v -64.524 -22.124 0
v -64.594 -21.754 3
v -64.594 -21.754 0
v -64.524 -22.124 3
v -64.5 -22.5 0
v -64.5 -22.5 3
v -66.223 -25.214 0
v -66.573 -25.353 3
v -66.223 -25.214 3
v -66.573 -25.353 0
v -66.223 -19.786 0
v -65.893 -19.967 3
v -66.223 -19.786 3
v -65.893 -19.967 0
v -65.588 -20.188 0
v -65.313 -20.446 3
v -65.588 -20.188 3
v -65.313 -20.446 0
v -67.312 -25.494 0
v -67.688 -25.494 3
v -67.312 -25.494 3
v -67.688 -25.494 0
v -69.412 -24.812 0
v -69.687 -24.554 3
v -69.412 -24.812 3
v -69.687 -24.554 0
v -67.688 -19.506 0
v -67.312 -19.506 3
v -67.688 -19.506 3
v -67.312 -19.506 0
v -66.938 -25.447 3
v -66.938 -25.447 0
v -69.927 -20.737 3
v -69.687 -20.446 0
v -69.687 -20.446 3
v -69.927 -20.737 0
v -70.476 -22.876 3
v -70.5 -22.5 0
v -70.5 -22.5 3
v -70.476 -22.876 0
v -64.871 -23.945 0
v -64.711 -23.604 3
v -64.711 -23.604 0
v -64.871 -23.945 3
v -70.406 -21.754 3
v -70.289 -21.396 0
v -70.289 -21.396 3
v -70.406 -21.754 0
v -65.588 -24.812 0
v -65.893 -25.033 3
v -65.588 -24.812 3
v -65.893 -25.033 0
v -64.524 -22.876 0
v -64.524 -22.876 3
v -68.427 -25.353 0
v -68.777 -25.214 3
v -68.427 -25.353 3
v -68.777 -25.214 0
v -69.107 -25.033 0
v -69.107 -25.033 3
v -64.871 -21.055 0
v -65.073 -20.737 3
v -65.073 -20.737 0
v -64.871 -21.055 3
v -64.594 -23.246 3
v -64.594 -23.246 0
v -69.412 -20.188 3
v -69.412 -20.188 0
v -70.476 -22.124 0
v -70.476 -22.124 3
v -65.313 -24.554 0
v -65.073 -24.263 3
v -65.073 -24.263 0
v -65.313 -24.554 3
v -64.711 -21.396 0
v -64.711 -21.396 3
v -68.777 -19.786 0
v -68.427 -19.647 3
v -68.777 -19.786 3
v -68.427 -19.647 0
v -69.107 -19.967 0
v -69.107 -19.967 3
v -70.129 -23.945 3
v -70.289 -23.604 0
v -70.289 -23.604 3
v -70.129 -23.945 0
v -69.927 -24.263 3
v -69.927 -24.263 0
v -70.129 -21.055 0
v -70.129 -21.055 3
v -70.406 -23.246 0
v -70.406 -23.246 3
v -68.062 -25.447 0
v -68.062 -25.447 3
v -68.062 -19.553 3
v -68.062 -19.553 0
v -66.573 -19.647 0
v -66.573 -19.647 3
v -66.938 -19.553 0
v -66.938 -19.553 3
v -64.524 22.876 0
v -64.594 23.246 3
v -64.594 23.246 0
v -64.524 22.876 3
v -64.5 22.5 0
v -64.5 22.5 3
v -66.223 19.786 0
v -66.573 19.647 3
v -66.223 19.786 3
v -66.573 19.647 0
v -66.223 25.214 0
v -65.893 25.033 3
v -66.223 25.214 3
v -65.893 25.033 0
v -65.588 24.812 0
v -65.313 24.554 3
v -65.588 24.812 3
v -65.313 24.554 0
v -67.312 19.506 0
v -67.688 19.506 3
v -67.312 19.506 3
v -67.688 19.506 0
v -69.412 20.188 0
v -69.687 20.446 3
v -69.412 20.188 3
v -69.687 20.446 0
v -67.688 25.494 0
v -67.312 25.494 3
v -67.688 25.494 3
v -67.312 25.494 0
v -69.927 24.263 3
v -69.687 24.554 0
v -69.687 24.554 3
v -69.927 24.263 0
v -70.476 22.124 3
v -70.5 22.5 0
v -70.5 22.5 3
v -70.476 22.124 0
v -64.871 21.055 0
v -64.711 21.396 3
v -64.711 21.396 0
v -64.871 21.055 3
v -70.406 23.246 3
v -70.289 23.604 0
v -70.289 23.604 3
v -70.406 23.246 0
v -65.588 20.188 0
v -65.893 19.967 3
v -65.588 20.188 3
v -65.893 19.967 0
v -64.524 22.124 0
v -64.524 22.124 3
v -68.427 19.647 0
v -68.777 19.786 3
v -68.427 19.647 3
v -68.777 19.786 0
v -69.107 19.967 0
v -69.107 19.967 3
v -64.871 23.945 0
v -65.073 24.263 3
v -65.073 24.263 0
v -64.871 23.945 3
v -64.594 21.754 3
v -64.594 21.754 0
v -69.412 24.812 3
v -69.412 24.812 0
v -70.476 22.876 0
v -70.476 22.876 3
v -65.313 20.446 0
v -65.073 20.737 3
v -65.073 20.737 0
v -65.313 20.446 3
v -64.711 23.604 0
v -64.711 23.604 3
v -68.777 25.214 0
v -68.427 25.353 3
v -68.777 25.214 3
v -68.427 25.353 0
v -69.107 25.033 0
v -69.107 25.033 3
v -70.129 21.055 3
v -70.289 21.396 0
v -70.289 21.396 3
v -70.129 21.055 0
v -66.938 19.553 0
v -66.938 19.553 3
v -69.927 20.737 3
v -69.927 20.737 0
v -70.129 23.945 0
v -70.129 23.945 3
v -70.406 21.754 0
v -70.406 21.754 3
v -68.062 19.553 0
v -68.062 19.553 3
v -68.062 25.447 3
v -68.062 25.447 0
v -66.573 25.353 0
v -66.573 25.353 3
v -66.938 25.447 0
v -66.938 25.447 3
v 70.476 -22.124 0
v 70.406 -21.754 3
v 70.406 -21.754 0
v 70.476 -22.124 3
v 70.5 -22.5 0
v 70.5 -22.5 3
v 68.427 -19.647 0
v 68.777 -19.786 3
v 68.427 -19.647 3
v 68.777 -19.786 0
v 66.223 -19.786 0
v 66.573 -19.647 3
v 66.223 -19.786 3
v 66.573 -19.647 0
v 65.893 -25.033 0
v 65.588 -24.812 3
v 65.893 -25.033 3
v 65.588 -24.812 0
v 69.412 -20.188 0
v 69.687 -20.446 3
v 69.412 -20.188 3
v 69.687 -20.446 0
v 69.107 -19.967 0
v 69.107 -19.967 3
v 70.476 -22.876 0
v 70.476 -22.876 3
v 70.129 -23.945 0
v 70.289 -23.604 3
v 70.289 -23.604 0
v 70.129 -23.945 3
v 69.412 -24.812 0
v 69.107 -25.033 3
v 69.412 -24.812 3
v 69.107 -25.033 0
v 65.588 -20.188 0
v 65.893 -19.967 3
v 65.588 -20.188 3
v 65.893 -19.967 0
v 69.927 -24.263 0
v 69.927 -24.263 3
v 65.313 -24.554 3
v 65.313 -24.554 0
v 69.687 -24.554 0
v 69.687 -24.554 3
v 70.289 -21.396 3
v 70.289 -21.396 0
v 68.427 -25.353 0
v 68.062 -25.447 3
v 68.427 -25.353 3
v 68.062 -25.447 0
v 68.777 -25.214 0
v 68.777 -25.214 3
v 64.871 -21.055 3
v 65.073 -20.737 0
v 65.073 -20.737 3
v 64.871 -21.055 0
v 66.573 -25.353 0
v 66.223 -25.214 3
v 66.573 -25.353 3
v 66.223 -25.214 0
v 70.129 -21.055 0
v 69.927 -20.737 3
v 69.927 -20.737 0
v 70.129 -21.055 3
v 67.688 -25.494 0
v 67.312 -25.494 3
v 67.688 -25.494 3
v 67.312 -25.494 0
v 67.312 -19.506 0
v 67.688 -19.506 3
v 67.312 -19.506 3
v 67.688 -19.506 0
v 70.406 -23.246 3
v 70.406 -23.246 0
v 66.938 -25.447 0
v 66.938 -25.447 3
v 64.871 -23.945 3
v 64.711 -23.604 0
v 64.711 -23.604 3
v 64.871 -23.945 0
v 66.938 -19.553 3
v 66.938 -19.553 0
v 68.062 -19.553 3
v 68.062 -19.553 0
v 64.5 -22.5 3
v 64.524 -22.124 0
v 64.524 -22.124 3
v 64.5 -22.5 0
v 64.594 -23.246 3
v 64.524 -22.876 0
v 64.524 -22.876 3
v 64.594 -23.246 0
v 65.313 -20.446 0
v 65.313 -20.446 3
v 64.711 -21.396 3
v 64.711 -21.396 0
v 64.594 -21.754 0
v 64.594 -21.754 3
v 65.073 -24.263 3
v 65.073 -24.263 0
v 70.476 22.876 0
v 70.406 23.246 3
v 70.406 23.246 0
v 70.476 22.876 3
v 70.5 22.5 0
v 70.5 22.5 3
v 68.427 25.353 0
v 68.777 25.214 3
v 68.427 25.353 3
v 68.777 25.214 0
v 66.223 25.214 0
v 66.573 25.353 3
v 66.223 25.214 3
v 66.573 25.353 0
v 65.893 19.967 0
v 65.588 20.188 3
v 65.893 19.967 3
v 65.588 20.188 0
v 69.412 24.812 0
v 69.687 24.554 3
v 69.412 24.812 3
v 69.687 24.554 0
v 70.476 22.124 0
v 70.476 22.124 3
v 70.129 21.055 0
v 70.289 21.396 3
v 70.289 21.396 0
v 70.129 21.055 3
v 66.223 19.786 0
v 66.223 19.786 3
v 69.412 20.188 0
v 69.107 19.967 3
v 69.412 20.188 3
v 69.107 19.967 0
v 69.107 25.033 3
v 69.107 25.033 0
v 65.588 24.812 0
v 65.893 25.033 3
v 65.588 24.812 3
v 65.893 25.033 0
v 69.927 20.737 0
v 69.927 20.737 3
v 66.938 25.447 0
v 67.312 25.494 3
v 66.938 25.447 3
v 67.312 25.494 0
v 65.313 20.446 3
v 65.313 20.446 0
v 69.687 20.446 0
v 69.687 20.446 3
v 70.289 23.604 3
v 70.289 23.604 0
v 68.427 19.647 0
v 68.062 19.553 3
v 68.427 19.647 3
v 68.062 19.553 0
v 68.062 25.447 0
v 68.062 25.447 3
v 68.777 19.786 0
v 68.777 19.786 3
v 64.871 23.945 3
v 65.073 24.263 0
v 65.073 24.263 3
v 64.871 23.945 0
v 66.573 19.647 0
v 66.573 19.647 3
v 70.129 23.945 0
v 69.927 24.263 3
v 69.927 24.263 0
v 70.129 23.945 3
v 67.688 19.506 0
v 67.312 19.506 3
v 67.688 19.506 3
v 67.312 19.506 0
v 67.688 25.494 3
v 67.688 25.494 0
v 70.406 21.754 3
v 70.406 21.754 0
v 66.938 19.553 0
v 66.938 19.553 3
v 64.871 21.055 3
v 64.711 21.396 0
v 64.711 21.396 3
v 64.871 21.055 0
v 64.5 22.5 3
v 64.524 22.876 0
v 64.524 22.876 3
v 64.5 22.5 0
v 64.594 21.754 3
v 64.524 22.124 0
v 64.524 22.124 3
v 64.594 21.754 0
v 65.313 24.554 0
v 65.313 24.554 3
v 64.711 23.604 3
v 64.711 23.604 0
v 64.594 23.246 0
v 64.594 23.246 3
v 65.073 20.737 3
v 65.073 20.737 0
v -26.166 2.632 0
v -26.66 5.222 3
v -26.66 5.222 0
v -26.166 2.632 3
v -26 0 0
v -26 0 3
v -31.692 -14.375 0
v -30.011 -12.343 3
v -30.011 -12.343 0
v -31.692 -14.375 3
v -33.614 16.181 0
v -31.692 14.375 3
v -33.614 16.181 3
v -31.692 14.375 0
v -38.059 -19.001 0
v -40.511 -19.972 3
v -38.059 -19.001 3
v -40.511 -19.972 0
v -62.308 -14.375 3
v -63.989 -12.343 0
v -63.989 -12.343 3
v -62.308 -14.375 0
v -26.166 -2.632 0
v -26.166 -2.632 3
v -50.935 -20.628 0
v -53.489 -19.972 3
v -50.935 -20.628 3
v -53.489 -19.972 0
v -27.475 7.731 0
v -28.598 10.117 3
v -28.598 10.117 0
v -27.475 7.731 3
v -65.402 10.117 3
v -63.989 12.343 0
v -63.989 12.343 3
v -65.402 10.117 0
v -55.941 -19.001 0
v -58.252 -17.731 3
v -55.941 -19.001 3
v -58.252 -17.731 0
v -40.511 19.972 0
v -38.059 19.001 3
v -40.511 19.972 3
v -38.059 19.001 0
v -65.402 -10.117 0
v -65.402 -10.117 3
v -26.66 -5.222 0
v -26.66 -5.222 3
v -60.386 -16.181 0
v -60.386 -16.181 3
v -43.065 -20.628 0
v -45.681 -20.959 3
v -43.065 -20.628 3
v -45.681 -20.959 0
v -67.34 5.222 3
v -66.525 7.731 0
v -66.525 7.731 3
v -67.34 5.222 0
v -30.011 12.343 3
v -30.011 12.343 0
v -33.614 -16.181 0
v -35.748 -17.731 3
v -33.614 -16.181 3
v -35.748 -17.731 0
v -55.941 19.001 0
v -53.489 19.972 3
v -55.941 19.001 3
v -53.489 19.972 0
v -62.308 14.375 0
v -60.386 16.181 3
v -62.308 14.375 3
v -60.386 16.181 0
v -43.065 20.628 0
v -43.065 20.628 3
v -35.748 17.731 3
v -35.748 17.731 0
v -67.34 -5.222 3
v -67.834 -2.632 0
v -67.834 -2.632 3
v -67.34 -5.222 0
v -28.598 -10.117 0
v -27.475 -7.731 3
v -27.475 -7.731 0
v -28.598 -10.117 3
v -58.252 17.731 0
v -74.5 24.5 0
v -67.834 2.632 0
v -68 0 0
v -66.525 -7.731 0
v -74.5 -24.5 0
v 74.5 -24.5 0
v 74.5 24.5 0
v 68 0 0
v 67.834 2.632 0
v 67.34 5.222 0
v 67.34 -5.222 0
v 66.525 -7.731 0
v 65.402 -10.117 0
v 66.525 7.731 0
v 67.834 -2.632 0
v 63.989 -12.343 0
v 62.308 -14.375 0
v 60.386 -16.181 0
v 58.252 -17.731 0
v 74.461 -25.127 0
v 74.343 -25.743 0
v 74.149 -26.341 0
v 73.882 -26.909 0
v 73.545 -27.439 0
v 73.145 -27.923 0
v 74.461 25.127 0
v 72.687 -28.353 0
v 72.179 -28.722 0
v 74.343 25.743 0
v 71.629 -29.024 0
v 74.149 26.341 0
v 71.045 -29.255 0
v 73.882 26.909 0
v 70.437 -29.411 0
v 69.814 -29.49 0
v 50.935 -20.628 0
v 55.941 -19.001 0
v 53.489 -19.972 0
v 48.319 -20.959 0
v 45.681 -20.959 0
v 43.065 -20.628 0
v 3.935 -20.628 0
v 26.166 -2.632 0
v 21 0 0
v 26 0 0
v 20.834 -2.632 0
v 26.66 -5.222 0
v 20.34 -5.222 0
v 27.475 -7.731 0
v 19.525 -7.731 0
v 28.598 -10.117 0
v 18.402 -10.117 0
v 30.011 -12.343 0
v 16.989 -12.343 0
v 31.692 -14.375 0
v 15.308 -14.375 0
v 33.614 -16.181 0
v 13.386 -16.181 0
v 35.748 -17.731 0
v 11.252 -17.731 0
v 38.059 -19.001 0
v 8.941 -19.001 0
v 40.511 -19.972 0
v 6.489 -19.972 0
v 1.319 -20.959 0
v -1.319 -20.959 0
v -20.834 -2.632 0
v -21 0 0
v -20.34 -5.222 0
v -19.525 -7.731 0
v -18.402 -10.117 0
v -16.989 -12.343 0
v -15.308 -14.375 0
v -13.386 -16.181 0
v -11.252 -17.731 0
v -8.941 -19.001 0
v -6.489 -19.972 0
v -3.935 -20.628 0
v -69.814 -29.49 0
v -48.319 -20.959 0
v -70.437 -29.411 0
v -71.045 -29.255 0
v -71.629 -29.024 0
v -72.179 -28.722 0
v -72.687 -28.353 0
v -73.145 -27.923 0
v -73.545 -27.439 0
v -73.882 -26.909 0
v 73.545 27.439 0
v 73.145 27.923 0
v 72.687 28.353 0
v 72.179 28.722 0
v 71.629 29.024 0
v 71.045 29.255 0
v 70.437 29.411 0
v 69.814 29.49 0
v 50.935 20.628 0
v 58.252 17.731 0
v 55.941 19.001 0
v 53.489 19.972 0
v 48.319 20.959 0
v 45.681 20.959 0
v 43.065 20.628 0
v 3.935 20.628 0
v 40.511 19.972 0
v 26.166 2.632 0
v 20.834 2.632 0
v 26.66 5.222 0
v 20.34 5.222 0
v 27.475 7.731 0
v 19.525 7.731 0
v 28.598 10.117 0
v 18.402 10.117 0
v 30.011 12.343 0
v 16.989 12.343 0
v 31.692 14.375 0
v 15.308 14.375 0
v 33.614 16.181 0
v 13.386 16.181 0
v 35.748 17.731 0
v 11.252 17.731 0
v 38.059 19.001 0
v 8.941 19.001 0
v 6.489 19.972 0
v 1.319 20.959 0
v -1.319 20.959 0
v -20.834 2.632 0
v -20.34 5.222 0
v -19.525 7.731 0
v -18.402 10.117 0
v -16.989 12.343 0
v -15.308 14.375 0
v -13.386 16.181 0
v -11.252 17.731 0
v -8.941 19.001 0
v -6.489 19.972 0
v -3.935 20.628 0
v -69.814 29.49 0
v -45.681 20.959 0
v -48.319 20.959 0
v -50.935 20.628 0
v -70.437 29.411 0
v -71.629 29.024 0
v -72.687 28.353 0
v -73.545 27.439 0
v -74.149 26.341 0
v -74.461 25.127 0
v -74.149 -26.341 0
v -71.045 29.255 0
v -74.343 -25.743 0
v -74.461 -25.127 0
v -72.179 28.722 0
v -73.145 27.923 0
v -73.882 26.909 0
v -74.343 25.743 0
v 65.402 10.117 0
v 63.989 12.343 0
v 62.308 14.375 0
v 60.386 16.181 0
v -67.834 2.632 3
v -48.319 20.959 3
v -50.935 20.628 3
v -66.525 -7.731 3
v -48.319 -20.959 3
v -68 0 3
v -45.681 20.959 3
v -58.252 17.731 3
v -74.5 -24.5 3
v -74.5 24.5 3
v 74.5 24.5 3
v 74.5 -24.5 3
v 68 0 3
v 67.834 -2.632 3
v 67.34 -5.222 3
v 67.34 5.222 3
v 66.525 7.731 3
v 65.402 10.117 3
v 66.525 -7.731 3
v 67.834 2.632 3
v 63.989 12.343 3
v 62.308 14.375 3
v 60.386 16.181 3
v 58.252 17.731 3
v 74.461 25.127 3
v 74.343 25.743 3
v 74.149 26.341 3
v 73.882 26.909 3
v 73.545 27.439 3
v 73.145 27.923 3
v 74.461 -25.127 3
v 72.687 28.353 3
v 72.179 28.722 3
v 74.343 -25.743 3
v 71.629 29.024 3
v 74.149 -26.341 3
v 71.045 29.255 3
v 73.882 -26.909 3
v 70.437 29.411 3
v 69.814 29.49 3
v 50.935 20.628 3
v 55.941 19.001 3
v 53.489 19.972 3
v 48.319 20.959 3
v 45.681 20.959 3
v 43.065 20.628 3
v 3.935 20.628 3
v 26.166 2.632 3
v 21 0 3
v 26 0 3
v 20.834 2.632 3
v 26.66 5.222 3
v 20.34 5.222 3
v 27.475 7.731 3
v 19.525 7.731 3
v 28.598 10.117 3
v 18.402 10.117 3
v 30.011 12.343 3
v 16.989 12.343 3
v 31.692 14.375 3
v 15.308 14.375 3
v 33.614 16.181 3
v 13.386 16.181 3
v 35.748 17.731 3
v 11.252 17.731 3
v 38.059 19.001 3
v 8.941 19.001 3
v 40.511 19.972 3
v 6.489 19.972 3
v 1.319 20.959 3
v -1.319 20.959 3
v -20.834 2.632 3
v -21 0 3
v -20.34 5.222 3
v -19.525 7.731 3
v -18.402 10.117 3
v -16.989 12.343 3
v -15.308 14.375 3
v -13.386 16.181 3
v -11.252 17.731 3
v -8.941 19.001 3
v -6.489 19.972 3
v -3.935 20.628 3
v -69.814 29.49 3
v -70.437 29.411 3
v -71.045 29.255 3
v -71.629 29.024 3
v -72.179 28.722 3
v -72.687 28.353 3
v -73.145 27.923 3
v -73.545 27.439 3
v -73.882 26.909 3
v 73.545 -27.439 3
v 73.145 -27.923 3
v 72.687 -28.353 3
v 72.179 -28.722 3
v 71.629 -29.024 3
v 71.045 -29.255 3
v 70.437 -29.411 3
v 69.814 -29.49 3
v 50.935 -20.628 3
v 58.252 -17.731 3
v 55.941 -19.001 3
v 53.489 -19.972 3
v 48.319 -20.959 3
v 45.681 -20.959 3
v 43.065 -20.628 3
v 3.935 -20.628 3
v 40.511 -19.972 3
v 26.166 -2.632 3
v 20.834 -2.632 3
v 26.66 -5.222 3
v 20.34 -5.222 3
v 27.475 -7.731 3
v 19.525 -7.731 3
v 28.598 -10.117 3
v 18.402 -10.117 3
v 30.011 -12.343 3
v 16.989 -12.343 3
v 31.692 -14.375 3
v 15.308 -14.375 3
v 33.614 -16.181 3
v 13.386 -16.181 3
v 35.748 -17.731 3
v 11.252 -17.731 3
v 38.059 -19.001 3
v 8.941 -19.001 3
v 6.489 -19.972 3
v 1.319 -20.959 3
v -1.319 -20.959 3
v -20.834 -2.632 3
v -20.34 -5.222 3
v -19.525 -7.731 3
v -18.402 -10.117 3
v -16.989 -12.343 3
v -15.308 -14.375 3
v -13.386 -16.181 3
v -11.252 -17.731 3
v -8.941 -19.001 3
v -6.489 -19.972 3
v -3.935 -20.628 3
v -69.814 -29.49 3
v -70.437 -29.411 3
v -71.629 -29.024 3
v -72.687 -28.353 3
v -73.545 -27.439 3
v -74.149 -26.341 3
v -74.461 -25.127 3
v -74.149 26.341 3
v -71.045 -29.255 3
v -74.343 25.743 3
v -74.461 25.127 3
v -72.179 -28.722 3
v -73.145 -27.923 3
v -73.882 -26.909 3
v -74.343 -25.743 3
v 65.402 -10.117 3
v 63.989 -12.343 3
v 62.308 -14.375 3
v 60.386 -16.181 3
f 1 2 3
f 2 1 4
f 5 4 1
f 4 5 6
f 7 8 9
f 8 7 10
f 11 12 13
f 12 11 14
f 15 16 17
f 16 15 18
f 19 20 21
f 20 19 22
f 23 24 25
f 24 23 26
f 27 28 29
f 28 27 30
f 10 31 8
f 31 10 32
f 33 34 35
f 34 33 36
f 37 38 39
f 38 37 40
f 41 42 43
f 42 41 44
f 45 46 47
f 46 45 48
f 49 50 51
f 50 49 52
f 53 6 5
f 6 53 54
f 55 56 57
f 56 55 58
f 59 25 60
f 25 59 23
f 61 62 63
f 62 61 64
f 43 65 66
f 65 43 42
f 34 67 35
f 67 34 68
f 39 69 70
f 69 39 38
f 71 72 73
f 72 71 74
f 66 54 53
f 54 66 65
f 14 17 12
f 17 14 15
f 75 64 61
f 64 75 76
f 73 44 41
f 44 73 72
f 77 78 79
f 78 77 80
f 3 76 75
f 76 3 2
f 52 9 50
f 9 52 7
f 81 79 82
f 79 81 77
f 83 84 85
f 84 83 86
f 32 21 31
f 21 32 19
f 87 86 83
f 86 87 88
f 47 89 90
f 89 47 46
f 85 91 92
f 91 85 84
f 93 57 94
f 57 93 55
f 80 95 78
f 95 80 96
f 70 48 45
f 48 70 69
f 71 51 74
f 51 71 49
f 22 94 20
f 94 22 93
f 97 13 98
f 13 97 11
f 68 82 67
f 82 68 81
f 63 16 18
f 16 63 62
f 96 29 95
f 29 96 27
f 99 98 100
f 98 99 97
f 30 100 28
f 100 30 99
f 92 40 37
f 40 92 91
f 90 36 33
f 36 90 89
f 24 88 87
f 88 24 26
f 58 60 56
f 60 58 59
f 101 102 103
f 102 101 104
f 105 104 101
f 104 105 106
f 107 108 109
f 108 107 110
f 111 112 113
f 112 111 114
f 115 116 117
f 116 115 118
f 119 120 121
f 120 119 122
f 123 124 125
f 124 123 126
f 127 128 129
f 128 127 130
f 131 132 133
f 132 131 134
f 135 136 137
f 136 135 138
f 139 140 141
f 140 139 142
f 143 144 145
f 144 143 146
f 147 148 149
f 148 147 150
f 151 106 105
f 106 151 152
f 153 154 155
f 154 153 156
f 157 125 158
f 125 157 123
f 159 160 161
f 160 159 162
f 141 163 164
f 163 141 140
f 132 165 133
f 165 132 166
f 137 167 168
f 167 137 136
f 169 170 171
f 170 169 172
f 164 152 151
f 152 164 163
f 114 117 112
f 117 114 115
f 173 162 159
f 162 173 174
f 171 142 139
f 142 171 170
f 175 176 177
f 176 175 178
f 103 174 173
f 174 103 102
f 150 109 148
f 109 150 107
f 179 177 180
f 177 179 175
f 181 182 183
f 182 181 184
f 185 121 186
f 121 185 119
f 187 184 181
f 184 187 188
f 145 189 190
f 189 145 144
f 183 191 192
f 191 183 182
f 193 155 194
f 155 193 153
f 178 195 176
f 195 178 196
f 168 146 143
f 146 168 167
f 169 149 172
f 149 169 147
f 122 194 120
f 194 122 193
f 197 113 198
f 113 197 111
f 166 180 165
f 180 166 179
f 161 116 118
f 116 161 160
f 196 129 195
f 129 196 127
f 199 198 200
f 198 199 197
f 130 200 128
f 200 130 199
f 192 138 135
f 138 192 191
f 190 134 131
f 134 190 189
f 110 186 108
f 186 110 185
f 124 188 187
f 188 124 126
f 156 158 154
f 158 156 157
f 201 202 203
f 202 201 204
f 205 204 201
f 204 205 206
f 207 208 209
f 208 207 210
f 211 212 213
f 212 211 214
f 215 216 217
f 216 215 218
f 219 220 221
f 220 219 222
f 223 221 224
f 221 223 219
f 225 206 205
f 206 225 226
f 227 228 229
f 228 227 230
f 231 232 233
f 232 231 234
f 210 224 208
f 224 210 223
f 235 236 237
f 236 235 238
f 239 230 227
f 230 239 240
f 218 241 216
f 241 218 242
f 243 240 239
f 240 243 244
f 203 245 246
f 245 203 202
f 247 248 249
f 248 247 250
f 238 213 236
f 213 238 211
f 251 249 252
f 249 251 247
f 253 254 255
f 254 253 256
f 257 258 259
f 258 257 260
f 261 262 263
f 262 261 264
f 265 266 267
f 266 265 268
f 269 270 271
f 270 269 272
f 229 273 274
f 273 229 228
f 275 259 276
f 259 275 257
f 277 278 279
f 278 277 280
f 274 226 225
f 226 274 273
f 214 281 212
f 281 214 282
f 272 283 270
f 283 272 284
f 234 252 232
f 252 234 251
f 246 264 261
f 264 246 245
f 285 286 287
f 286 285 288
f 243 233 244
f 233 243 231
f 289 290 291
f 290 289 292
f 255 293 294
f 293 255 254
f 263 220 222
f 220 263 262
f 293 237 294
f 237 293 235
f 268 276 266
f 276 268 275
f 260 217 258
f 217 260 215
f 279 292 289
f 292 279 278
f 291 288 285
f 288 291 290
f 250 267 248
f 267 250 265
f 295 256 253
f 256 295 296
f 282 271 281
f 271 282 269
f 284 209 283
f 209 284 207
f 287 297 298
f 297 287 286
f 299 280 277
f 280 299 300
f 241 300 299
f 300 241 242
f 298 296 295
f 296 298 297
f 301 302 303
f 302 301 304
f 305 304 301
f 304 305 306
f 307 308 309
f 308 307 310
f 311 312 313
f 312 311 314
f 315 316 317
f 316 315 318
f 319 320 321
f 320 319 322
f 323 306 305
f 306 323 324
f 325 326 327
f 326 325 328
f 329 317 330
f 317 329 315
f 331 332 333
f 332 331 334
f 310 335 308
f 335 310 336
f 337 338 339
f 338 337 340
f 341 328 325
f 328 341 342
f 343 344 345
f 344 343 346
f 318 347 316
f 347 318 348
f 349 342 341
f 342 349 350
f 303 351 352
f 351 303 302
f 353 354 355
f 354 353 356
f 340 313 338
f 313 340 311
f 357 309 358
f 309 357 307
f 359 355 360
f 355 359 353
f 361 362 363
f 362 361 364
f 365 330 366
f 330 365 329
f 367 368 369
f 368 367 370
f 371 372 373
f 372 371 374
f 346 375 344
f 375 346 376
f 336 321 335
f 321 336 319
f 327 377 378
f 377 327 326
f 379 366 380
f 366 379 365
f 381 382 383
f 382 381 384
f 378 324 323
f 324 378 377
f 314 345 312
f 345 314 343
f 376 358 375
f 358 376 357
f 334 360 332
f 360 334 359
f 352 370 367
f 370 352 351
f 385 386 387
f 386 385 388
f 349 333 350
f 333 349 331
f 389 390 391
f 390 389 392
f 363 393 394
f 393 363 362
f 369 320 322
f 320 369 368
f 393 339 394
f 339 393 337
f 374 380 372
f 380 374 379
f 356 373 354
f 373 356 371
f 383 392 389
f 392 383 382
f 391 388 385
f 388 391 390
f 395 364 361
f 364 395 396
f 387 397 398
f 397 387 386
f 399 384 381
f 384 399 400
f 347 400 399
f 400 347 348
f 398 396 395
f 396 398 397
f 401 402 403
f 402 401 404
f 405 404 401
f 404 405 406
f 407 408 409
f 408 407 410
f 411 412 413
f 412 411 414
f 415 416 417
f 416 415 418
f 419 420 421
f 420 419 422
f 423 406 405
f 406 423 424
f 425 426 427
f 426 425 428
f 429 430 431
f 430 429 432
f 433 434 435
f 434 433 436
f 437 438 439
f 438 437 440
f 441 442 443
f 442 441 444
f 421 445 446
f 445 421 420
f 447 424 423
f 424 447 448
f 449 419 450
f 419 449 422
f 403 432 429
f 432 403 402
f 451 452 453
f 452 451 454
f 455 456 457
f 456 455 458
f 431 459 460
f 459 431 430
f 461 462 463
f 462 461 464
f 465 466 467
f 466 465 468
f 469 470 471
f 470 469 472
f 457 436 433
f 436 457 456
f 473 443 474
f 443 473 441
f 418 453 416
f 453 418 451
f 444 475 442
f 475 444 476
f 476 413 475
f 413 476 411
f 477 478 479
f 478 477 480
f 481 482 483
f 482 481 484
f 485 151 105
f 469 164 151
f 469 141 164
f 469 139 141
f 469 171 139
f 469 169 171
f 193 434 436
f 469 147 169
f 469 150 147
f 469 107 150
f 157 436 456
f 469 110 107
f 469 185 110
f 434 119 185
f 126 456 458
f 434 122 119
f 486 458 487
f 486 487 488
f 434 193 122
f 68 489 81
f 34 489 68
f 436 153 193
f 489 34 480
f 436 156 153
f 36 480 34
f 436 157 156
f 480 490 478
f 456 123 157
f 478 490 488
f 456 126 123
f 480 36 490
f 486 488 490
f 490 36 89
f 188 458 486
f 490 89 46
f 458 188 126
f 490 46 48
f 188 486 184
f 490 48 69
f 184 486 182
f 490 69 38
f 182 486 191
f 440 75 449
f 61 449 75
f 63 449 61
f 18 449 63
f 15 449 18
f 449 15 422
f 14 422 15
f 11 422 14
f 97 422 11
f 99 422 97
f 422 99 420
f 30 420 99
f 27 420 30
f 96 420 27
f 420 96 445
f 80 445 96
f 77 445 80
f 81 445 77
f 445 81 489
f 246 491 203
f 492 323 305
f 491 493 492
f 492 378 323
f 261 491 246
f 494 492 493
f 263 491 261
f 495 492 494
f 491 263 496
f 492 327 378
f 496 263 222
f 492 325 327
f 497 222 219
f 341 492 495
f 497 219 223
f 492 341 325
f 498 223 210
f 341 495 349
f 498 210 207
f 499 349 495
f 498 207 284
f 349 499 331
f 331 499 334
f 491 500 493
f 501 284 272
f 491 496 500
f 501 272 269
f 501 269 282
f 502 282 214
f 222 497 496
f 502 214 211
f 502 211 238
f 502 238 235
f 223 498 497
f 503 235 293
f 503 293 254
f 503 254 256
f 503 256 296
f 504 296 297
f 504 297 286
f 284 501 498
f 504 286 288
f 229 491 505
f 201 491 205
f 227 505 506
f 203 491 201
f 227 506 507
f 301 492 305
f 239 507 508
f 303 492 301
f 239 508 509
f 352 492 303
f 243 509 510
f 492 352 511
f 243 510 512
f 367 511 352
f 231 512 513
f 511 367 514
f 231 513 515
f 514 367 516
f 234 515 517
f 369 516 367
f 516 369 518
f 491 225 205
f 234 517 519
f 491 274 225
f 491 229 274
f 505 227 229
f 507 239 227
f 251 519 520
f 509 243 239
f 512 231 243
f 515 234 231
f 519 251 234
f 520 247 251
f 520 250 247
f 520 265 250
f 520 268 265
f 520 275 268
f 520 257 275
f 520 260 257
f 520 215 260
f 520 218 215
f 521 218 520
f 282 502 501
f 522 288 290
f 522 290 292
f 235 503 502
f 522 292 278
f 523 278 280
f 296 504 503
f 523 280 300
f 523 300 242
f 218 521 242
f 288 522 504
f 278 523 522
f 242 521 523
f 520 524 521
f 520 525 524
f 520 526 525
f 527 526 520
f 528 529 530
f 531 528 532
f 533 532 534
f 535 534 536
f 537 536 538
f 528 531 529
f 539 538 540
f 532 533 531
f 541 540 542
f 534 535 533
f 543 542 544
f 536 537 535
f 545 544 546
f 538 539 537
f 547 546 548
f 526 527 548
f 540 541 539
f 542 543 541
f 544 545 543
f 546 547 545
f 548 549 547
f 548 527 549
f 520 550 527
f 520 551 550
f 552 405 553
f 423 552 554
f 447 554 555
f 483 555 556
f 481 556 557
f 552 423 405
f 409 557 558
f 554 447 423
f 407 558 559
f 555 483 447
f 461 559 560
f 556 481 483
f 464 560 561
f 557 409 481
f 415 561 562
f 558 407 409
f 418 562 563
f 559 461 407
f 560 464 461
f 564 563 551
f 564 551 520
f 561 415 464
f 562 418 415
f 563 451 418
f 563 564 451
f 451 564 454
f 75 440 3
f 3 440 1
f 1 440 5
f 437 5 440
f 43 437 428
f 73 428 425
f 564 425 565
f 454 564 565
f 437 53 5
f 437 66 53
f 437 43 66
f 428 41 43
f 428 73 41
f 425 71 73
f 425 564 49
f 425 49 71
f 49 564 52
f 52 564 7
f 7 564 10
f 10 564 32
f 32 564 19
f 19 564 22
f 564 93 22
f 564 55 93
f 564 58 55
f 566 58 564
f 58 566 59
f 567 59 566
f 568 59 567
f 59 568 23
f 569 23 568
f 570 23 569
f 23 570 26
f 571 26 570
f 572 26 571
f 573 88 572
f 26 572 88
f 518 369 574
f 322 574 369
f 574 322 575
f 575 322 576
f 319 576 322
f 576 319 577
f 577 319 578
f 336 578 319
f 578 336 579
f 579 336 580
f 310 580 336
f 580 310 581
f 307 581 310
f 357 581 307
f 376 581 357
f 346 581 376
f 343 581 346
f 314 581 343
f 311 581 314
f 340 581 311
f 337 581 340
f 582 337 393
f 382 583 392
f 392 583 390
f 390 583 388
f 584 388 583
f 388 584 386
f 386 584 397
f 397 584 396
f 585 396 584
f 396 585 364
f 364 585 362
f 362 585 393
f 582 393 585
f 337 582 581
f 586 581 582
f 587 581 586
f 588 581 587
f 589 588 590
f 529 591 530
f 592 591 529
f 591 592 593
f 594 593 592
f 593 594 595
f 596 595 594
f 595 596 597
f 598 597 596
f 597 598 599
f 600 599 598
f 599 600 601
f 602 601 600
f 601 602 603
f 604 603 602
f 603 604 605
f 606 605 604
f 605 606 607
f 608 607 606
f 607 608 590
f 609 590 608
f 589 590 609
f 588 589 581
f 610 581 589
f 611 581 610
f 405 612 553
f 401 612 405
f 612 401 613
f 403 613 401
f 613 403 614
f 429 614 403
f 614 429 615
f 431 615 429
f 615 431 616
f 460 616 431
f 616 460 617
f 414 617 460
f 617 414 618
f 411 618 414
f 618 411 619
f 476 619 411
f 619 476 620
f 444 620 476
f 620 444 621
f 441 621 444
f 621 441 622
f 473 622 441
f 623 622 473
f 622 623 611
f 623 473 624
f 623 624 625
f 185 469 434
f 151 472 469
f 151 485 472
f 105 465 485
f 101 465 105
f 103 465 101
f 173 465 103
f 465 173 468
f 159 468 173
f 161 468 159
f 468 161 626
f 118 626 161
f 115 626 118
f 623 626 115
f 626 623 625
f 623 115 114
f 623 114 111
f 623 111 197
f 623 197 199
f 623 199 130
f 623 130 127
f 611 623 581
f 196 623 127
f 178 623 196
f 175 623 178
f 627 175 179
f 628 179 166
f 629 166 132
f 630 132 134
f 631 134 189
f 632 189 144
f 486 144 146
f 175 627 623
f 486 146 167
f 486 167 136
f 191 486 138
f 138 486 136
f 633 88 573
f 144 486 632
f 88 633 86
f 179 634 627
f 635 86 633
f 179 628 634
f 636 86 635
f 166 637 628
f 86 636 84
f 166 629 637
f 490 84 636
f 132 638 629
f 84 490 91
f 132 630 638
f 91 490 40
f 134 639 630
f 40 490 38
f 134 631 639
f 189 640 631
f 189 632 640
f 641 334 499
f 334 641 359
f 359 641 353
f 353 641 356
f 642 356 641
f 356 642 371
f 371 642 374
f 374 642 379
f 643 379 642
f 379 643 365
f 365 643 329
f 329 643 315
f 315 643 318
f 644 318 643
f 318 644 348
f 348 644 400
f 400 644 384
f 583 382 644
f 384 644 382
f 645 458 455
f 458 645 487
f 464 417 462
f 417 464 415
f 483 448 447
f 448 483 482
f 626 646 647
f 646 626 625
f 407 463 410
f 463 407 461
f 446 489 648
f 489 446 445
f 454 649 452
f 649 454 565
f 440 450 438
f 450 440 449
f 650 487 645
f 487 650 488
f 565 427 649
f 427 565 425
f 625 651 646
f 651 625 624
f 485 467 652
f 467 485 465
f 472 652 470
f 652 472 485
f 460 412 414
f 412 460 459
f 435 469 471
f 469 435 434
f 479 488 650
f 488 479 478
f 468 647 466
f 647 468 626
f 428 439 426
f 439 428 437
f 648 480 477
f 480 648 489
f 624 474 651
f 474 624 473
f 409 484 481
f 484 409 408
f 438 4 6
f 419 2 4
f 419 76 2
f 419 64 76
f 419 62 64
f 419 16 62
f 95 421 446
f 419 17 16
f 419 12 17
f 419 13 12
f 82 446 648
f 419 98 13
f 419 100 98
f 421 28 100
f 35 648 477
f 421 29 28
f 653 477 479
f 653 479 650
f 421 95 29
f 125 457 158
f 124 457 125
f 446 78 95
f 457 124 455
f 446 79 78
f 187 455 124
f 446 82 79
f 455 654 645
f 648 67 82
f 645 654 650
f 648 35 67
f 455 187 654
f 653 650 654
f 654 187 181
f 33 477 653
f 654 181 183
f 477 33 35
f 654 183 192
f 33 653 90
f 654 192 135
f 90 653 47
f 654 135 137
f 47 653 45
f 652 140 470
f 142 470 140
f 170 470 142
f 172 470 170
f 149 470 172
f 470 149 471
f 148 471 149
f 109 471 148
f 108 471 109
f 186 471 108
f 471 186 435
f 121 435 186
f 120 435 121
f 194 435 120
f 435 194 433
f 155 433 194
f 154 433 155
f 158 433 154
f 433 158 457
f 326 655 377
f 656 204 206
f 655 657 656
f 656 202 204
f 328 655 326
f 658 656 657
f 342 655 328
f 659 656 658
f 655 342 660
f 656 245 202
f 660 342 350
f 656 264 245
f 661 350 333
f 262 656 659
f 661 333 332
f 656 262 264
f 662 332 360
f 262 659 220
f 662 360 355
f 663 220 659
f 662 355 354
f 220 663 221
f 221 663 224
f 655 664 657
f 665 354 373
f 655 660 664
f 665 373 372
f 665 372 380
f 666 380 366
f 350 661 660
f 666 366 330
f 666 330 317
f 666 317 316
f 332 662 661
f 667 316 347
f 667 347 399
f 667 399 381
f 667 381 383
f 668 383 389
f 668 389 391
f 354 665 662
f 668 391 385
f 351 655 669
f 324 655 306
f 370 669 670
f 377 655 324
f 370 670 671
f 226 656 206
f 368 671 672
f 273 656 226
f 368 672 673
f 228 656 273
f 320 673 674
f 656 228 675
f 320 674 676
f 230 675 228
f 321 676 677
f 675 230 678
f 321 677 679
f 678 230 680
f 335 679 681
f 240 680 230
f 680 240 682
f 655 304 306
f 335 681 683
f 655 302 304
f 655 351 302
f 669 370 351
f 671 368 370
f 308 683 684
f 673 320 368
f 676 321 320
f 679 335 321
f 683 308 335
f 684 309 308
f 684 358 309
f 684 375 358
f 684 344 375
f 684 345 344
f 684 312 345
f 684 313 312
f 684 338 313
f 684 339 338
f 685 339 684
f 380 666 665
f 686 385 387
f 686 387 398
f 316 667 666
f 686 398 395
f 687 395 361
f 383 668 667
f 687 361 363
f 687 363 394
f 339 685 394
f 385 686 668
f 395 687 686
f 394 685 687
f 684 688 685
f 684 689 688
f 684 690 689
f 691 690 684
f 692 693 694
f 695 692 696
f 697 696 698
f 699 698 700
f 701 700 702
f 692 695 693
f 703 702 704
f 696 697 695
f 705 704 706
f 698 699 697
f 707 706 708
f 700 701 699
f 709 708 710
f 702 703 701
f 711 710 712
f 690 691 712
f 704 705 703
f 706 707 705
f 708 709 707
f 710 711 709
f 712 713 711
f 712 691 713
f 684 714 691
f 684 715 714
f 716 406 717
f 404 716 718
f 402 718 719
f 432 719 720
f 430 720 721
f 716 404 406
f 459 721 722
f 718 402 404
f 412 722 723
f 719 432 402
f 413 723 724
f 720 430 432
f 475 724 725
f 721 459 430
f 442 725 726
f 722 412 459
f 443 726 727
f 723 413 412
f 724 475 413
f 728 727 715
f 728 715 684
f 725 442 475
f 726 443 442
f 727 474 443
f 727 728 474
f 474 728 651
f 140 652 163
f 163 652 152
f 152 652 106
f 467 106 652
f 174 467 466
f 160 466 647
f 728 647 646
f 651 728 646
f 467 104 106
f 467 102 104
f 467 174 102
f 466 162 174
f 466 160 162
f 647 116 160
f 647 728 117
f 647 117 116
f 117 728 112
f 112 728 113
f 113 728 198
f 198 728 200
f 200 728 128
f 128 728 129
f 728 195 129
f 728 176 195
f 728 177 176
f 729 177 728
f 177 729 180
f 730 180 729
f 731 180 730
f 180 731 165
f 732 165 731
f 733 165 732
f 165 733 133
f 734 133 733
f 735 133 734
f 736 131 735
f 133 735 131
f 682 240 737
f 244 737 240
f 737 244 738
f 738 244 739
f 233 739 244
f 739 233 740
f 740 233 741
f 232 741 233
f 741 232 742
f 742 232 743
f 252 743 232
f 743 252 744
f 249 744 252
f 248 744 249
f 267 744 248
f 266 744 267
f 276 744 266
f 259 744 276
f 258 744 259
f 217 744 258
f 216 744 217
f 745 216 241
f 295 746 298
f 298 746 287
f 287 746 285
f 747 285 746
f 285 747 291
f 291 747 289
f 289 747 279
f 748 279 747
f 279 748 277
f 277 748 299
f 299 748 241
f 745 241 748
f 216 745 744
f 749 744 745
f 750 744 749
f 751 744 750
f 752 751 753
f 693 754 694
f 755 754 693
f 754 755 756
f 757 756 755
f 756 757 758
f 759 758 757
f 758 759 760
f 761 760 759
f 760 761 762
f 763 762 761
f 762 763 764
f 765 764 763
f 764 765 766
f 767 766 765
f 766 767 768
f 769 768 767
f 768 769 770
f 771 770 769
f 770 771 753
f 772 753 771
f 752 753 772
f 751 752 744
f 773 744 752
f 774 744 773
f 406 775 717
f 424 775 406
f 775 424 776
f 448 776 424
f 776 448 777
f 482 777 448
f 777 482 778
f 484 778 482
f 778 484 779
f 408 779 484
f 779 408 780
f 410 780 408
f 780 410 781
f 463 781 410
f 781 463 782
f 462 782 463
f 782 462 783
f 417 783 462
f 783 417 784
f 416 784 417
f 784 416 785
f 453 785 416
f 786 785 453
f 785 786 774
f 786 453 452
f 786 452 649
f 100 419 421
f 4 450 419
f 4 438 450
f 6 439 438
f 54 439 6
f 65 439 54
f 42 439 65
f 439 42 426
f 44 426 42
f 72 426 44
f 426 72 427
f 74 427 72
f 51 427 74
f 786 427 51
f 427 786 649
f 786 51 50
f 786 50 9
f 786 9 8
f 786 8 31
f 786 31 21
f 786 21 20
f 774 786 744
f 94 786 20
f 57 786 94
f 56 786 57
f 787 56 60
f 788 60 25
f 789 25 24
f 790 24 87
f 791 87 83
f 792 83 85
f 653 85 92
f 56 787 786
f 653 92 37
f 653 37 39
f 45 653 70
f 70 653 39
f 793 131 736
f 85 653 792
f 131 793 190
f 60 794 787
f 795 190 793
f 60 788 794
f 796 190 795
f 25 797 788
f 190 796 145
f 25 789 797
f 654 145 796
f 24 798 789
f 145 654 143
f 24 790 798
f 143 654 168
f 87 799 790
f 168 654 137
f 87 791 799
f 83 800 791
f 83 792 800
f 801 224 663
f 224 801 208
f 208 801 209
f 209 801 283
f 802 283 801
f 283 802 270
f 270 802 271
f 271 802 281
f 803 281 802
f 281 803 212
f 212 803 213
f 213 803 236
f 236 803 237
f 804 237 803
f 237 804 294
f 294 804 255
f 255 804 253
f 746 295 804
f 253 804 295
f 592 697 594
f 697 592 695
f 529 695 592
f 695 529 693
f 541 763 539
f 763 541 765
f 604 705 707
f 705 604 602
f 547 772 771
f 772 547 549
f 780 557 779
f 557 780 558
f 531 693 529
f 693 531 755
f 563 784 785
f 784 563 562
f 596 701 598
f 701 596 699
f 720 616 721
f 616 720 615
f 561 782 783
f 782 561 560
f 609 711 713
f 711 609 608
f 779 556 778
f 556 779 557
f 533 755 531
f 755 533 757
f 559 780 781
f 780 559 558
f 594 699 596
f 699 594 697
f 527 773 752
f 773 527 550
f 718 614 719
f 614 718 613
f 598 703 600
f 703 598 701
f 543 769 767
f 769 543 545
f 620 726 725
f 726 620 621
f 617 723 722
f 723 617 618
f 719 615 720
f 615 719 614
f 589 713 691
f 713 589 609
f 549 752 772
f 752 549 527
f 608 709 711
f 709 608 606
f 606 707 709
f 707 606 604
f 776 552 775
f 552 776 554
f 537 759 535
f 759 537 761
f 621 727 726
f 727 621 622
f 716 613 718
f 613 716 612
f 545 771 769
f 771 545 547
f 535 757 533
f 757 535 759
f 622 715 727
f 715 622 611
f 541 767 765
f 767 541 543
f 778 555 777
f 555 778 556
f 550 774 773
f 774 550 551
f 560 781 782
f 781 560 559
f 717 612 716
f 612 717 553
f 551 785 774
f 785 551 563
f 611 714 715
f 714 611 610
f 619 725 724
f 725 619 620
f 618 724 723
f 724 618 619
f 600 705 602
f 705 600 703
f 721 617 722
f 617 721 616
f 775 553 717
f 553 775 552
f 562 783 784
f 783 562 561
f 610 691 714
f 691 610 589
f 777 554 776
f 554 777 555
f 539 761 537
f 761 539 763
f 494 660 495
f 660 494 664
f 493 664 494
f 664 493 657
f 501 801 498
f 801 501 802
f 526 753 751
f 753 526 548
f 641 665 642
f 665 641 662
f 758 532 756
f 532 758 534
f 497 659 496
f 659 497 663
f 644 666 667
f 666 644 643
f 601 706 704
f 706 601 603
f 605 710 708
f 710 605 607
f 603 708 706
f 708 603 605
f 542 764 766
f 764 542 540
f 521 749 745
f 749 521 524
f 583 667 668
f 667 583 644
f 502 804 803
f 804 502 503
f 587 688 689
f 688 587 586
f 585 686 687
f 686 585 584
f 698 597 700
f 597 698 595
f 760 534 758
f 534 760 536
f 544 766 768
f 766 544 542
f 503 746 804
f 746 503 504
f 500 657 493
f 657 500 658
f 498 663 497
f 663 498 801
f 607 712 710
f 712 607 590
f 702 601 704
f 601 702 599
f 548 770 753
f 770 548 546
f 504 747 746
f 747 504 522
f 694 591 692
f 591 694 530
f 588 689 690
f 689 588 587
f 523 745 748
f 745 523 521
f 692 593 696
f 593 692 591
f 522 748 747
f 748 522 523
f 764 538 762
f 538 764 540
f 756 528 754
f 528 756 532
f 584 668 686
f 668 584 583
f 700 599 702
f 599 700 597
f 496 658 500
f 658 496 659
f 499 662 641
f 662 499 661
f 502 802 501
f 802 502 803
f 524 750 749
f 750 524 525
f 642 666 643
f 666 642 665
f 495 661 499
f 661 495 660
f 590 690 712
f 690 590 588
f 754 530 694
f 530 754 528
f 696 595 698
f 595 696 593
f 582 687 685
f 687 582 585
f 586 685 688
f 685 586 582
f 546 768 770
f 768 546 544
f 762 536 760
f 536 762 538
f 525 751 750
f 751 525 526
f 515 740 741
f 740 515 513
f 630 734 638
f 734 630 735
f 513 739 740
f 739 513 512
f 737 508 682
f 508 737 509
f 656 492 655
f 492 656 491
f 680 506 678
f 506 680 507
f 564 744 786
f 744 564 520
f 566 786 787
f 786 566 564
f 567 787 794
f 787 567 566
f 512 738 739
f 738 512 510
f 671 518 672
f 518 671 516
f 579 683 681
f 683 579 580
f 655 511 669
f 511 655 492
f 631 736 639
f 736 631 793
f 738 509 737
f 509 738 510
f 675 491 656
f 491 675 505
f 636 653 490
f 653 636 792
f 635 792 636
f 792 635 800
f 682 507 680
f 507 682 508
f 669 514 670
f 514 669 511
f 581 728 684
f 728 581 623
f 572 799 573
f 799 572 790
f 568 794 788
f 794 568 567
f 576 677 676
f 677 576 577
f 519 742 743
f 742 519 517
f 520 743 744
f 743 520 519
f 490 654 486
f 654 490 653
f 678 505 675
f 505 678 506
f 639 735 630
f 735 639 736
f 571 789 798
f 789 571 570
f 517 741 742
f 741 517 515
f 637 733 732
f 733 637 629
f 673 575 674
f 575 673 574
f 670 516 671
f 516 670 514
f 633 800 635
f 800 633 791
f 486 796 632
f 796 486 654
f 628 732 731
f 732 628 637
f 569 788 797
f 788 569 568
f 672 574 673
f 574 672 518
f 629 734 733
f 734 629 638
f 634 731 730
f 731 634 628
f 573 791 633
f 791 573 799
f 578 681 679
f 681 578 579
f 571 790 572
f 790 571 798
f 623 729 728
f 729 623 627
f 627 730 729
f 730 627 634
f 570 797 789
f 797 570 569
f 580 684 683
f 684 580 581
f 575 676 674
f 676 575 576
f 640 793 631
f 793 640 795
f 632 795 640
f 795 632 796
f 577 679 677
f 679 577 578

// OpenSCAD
$fn = 50;


difference() {
	union() {
		hull() {
			translate(v = [-69.5000000000, 24.5000000000, 0]) {
				cylinder(h = 3, r = 5);
			}
			translate(v = [69.5000000000, 24.5000000000, 0]) {
				cylinder(h = 3, r = 5);
			}
			translate(v = [-69.5000000000, -24.5000000000, 0]) {
				cylinder(h = 3, r = 5);
			}
			translate(v = [69.5000000000, -24.5000000000, 0]) {
				cylinder(h = 3, r = 5);
			}
		}
	}
	union() {
		#translate(v = [-67.5000000000, -22.5000000000, -100.0000000000]) {
			cylinder(h = 200, r = 3.0000000000);
		}
		#translate(v = [-67.5000000000, 22.5000000000, -100.0000000000]) {
			cylinder(h = 200, r = 3.0000000000);
		}
		#translate(v = [67.5000000000, -22.5000000000, -100.0000000000]) {
			cylinder(h = 200, r = 3.0000000000);
		}
		#translate(v = [67.5000000000, 22.5000000000, -100.0000000000]) {
			cylinder(h = 200, r = 3.0000000000);
		}
		#translate(v = [-47.0000000000, 0, 0]) {
			cylinder(h = 3, r = 21.0000000000);
		}
		#cylinder(h = 3, r = 21.0000000000);
		#translate(v = [47.0000000000, 0, 0]) {
			cylinder(h = 3, r = 21.0000000000);
		}
	}
}
